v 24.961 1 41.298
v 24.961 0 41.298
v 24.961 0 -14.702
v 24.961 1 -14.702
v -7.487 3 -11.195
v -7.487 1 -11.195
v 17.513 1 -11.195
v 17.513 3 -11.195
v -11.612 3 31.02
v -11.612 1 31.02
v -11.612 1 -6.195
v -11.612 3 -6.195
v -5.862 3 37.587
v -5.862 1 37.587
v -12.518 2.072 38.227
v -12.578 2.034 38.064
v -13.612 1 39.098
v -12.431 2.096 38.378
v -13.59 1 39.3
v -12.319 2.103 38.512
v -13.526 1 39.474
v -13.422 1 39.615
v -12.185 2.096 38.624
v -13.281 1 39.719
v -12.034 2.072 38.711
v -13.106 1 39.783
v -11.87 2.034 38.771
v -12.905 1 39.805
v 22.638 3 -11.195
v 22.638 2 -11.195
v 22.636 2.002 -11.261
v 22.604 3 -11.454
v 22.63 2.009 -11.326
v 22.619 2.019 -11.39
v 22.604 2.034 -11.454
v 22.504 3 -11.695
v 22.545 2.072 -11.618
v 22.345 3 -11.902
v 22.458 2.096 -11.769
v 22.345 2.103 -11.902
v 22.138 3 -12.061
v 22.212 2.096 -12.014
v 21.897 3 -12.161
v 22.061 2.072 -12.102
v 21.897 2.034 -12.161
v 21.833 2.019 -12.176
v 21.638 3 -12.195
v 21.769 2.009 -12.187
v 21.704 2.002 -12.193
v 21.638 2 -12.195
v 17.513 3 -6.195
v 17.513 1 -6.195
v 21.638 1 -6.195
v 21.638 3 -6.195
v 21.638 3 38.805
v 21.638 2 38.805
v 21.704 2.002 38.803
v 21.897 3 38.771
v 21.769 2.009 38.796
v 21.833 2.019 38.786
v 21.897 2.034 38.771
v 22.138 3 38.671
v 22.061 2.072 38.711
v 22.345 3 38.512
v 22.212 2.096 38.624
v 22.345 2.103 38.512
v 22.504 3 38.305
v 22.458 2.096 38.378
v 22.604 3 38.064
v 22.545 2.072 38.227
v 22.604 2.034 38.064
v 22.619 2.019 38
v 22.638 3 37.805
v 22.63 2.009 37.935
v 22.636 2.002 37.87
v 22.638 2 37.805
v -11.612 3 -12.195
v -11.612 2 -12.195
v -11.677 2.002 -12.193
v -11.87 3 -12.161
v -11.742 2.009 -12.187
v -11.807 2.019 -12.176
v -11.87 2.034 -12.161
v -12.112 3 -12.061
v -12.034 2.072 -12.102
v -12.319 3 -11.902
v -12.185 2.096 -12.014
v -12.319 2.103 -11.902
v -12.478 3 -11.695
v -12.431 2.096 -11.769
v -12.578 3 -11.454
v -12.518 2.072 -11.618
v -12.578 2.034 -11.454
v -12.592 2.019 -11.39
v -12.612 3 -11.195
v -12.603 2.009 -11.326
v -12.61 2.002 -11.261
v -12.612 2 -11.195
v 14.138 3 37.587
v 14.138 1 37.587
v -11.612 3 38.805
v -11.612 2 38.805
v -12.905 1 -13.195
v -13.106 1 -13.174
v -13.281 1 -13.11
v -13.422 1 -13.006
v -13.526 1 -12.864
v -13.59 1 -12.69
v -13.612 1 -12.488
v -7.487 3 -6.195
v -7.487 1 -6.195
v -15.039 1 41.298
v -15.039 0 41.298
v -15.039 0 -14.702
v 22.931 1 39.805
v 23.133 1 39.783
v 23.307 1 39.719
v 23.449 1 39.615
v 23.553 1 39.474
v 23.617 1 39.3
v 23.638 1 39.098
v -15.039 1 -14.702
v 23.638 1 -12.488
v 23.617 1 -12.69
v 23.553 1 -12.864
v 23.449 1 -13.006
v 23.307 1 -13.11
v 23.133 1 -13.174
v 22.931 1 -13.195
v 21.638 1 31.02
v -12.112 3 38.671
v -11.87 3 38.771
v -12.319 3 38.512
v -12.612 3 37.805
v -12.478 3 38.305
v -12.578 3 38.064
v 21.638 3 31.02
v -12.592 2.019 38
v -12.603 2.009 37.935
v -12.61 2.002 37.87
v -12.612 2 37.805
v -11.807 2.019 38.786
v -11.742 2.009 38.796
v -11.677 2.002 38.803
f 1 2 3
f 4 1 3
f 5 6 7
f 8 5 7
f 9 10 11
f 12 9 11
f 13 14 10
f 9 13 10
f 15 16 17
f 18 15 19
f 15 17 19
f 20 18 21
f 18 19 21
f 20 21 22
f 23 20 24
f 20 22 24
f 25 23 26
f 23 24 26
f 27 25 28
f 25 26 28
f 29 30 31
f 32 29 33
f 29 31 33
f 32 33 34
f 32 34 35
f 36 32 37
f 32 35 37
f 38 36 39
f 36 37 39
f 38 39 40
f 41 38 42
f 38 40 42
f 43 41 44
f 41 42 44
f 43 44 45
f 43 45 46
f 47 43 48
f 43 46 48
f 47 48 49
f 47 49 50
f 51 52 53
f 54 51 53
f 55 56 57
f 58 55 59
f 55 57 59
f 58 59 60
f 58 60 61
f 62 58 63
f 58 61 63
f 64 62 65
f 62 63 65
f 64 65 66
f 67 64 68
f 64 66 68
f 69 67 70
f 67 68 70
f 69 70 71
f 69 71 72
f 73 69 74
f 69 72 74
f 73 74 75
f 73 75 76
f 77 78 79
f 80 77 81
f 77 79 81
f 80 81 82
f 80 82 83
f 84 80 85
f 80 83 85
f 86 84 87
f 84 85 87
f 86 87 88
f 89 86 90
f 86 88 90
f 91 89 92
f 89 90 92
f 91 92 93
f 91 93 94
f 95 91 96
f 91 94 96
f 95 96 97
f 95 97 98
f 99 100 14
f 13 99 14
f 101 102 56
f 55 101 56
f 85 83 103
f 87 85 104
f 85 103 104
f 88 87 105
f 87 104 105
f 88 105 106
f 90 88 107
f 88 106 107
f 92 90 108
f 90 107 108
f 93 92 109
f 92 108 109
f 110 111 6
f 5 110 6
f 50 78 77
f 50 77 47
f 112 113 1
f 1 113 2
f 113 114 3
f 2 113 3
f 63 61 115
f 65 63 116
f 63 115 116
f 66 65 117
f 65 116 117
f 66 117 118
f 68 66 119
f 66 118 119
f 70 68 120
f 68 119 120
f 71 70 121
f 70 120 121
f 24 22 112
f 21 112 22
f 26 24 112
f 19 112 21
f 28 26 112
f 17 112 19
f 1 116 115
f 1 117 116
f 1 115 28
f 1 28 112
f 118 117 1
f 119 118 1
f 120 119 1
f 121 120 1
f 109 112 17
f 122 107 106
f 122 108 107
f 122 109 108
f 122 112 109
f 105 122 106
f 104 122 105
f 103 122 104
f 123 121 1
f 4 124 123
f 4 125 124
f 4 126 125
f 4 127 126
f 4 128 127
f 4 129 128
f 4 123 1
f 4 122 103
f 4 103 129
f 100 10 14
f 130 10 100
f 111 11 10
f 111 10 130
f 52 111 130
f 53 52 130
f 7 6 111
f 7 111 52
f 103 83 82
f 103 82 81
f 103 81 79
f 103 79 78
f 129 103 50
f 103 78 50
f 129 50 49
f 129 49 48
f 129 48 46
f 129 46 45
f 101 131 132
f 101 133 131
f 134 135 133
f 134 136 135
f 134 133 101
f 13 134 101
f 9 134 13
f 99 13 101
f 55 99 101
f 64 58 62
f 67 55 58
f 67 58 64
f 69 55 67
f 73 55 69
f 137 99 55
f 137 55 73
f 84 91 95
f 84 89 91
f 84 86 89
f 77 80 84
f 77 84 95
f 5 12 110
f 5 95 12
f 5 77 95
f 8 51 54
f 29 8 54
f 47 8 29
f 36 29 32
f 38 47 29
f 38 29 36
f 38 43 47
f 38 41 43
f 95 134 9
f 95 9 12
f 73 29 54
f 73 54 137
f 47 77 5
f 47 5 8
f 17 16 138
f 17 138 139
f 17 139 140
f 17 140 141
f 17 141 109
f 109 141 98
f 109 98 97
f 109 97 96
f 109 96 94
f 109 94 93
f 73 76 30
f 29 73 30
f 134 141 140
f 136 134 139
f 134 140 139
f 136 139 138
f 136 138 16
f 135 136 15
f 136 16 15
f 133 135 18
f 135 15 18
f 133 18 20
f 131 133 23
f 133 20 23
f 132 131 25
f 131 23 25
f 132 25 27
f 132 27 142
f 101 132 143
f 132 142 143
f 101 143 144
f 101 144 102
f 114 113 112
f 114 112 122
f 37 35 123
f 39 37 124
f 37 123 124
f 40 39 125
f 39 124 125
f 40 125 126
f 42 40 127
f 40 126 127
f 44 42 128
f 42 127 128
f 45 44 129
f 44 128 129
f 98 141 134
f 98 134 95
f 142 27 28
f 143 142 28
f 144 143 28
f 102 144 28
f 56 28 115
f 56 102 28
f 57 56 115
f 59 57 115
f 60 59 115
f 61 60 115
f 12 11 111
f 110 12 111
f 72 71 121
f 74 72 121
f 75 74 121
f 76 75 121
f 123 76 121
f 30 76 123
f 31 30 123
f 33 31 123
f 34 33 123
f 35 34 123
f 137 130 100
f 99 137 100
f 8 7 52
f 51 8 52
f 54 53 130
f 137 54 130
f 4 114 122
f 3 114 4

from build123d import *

# Parameters (mm, degrees)
SKETCH_1_W      = 40
SKETCH_1_H      = 56
EXTRUDE_1_DEPTH = 1
SKETCH_2_W      = 35.25
SKETCH_2_H      = 51
EXTRUDE_2_DEPTH = 2
CHAMFER_1_SIZE  = 1
FILLET_1_R      = 1


with BuildPart() as part:
    # Эскиз1 → Бобышка-Вытянуть1 (new body)
    with BuildSketch(Plane(origin=(0, 0, 0), x_dir=(1, 0, 0), z_dir=(0, 1, 0))):
        with Locations((4.960996663, -13.297915159)):
            Rectangle(SKETCH_1_W, SKETCH_1_H)
    extrude(amount=EXTRUDE_1_DEPTH)

    # Эскиз2 → Бобышка-Вытянуть2 (add)
    with BuildSketch(Plane(origin=(0, 1, 0), x_dir=(1, 0, 0), z_dir=(0, 1, 0))):
        with Locations((5.013351172, -13.304787139)):
            Rectangle(SKETCH_2_W, SKETCH_2_H)
        Polygon((-7.486648828, 11.195212861), (17.513351172, 11.195212861), (17.513351172, 6.195212861), (21.638351172, 6.195212861), (21.638351172, -31.019787139), (14.138351172, -37.586749907), (-5.861648828, -37.586749907), (-11.611648828, -31.019787139), (-11.611648828, 6.195212861), (-7.486648828, 6.195212861), align=None, mode=Mode.SUBTRACT)
    extrude(amount=EXTRUDE_2_DEPTH)

    # Фаска1
    chamfer_1_edges = [part.edges().sort_by_distance(p)[0] for p in [
        (-12.611648828, 1, 13.304787139),
        (5.013351172, 1, 38.804787139),
        (22.638351172, 1, 13.304787139),
        (5.013351172, 1, -12.195212861),
    ]]
    chamfer(chamfer_1_edges, length=CHAMFER_1_SIZE)

    # Скругление1
    # the kernel refuses this fillet: 1 mm, written as the material it takes off along each edge
    with BuildSketch(Plane(origin=(-12.611648828, -0.5, -12.195212861), x_dir=(0, 0, 1), z_dir=(0, 1, 0))) as fillet_1_piece_1_section:
        with BuildLine():
            CenterArc((FILLET_1_R, FILLET_1_R), FILLET_1_R, 180, 90)
            Line((0, FILLET_1_R), (0, 0))
            Line((0, 0), (FILLET_1_R, 0))
        make_face()
    fillet_1_piece_1 = extrude(amount=6, mode=Mode.PRIVATE)
    fillet_1_piece_1 = split(fillet_1_piece_1, bisect_by=Plane(origin=(-12.204207693, 2.407441135, -12.152230903), z_dir=(0.7071067811865476, -0.7071067811865476, 0)), keep=Keep.TOP, mode=Mode.PRIVATE)
    fillet_1_piece_1 = split(fillet_1_piece_1, bisect_by=Plane(origin=(-12.0827213, 2.16446835, -12.030744511), z_dir=(0, 0.7071067811865476, -0.7071067811865476)), keep=Keep.TOP, mode=Mode.PRIVATE)
    add(fillet_1_piece_1, mode=Mode.SUBTRACT)
    with BuildSketch(Plane(origin=(-12.611648828, -0.5, -12.195212861), x_dir=(0, 0, 1), z_dir=(0, 1, 0))) as fillet_1_piece_2_section:
        with BuildLine():
            CenterArc((FILLET_1_R, FILLET_1_R), FILLET_1_R, 180, 90)
            Line((0, FILLET_1_R), (0, 0))
            Line((0, 0), (FILLET_1_R, 0))
        make_face()
    fillet_1_piece_2 = extrude(amount=6, mode=Mode.PRIVATE)
    fillet_1_piece_2 = split(fillet_1_piece_2, bisect_by=Plane(origin=(-12.447180477, 2.16446835, -11.666285334), z_dir=(-0.7071067811865476, 0.7071067811865476, 0)), keep=Keep.TOP, mode=Mode.PRIVATE)
    fillet_1_piece_2 = split(fillet_1_piece_2, bisect_by=Plane(origin=(-12.56866687, 2.407441135, -11.787771726), z_dir=(0, -0.7071067811865476, 0.7071067811865476)), keep=Keep.TOP, mode=Mode.PRIVATE)
    add(fillet_1_piece_2, mode=Mode.SUBTRACT)
    with BuildSketch(Plane(origin=(-12.611648828, -0.5, -12.195212861), x_dir=(0, 0, 1), z_dir=(0, 1, 0))) as fillet_1_piece_3_section:
        with BuildLine():
            CenterArc((FILLET_1_R, FILLET_1_R), FILLET_1_R, 180, 90)
            Line((0, FILLET_1_R), (0, 0))
            Line((0, 0), (FILLET_1_R, 0))
        make_face()
    fillet_1_piece_3 = extrude(amount=6, mode=Mode.PRIVATE)
    fillet_1_piece_3 = split(fillet_1_piece_3, bisect_by=Plane(origin=(-11.535111432, 3.076537395, -11.974767382), z_dir=(-0.7071067811865476, 0.7071067811865476, 0)), keep=Keep.TOP, mode=Mode.PRIVATE)
    fillet_1_piece_3 = split(fillet_1_piece_3, bisect_by=Plane(origin=(-12.391203349, 3.076537395, -11.118675466), z_dir=(0, 0.7071067811865476, -0.7071067811865476)), keep=Keep.TOP, mode=Mode.PRIVATE)
    add(fillet_1_piece_3, mode=Mode.SUBTRACT)
    with BuildSketch(Plane(origin=(-12.611648828, -0.5, 38.804787139), x_dir=(0, 0, -1), z_dir=(0, 1, 0))) as fillet_1_piece_4_section:
        with BuildLine():
            CenterArc((FILLET_1_R, -FILLET_1_R), FILLET_1_R, 90, 90)
            Line((0, -FILLET_1_R), (0, 0))
            Line((0, 0), (FILLET_1_R, 0))
        make_face()
    fillet_1_piece_4 = extrude(amount=6, mode=Mode.PRIVATE)
    fillet_1_piece_4 = split(fillet_1_piece_4, bisect_by=Plane(origin=(-12.204207693, 2.407441135, 38.761805181), z_dir=(0.7071067811865476, -0.7071067811865476, 0)), keep=Keep.TOP, mode=Mode.PRIVATE)
    fillet_1_piece_4 = split(fillet_1_piece_4, bisect_by=Plane(origin=(-12.0827213, 2.16446835, 38.640318789), z_dir=(0, 0.7071067811865476, 0.7071067811865476)), keep=Keep.TOP, mode=Mode.PRIVATE)
    add(fillet_1_piece_4, mode=Mode.SUBTRACT)
    with BuildSketch(Plane(origin=(-12.611648828, -0.5, 38.804787139), x_dir=(0, 0, -1), z_dir=(0, 1, 0))) as fillet_1_piece_5_section:
        with BuildLine():
            CenterArc((FILLET_1_R, -FILLET_1_R), FILLET_1_R, 90, 90)
            Line((0, -FILLET_1_R), (0, 0))
            Line((0, 0), (FILLET_1_R, 0))
        make_face()
    fillet_1_piece_5 = extrude(amount=6, mode=Mode.PRIVATE)
    fillet_1_piece_5 = split(fillet_1_piece_5, bisect_by=Plane(origin=(-12.447180477, 2.16446835, 38.275859612), z_dir=(-0.7071067811865476, 0.7071067811865476, 0)), keep=Keep.TOP, mode=Mode.PRIVATE)
    fillet_1_piece_5 = split(fillet_1_piece_5, bisect_by=Plane(origin=(-12.56866687, 2.407441135, 38.397346004), z_dir=(0, -0.7071067811865476, -0.7071067811865476)), keep=Keep.TOP, mode=Mode.PRIVATE)
    add(fillet_1_piece_5, mode=Mode.SUBTRACT)
    with BuildSketch(Plane(origin=(-12.611648828, -0.5, 38.804787139), x_dir=(0, 0, -1), z_dir=(0, 1, 0))) as fillet_1_piece_6_section:
        with BuildLine():
            CenterArc((FILLET_1_R, -FILLET_1_R), FILLET_1_R, 90, 90)
            Line((0, -FILLET_1_R), (0, 0))
            Line((0, 0), (FILLET_1_R, 0))
        make_face()
    fillet_1_piece_6 = extrude(amount=6, mode=Mode.PRIVATE)
    fillet_1_piece_6 = split(fillet_1_piece_6, bisect_by=Plane(origin=(-11.535111432, 3.076537395, 38.58434166), z_dir=(-0.7071067811865476, 0.7071067811865476, 0)), keep=Keep.TOP, mode=Mode.PRIVATE)
    fillet_1_piece_6 = split(fillet_1_piece_6, bisect_by=Plane(origin=(-12.391203349, 3.076537395, 37.728249744), z_dir=(0, 0.7071067811865476, 0.7071067811865476)), keep=Keep.TOP, mode=Mode.PRIVATE)
    add(fillet_1_piece_6, mode=Mode.SUBTRACT)
    with BuildSketch(Plane(origin=(22.638351172, -0.5, 38.804787139), x_dir=(-1, 0, 0), z_dir=(0, 1, 0))) as fillet_1_piece_7_section:
        with BuildLine():
            CenterArc((FILLET_1_R, -FILLET_1_R), FILLET_1_R, 90, 90)
            Line((0, -FILLET_1_R), (0, 0))
            Line((0, 0), (FILLET_1_R, 0))
        make_face()
    fillet_1_piece_7 = extrude(amount=6, mode=Mode.PRIVATE)
    fillet_1_piece_7 = split(fillet_1_piece_7, bisect_by=Plane(origin=(22.595369214, 2.407441135, 38.397346004), z_dir=(0, -0.7071067811865476, -0.7071067811865476)), keep=Keep.TOP, mode=Mode.PRIVATE)
    fillet_1_piece_7 = split(fillet_1_piece_7, bisect_by=Plane(origin=(22.473882822, 2.16446835, 38.275859612), z_dir=(0.7071067811865476, 0.7071067811865476, 0)), keep=Keep.TOP, mode=Mode.PRIVATE)
    add(fillet_1_piece_7, mode=Mode.SUBTRACT)
    with BuildSketch(Plane(origin=(22.638351172, -0.5, 38.804787139), x_dir=(-1, 0, 0), z_dir=(0, 1, 0))) as fillet_1_piece_8_section:
        with BuildLine():
            CenterArc((FILLET_1_R, -FILLET_1_R), FILLET_1_R, 90, 90)
            Line((0, -FILLET_1_R), (0, 0))
            Line((0, 0), (FILLET_1_R, 0))
        make_face()
    fillet_1_piece_8 = extrude(amount=6, mode=Mode.PRIVATE)
    fillet_1_piece_8 = split(fillet_1_piece_8, bisect_by=Plane(origin=(22.109423645, 2.16446835, 38.640318789), z_dir=(0, 0.7071067811865476, 0.7071067811865476)), keep=Keep.TOP, mode=Mode.PRIVATE)
    fillet_1_piece_8 = split(fillet_1_piece_8, bisect_by=Plane(origin=(22.230910038, 2.407441135, 38.761805181), z_dir=(-0.7071067811865476, -0.7071067811865476, 0)), keep=Keep.TOP, mode=Mode.PRIVATE)
    add(fillet_1_piece_8, mode=Mode.SUBTRACT)
    with BuildSketch(Plane(origin=(22.638351172, -0.5, 38.804787139), x_dir=(-1, 0, 0), z_dir=(0, 1, 0))) as fillet_1_piece_9_section:
        with BuildLine():
            CenterArc((FILLET_1_R, -FILLET_1_R), FILLET_1_R, 90, 90)
            Line((0, -FILLET_1_R), (0, 0))
            Line((0, 0), (FILLET_1_R, 0))
        make_face()
    fillet_1_piece_9 = extrude(amount=6, mode=Mode.PRIVATE)
    fillet_1_piece_9 = split(fillet_1_piece_9, bisect_by=Plane(origin=(22.417905694, 3.076537395, 37.728249744), z_dir=(0, 0.7071067811865476, 0.7071067811865476)), keep=Keep.TOP, mode=Mode.PRIVATE)
    fillet_1_piece_9 = split(fillet_1_piece_9, bisect_by=Plane(origin=(21.561813777, 3.076537395, 38.58434166), z_dir=(0.7071067811865476, 0.7071067811865476, 0)), keep=Keep.TOP, mode=Mode.PRIVATE)
    add(fillet_1_piece_9, mode=Mode.SUBTRACT)
    with BuildSketch(Plane(origin=(22.638351172, -0.5, -12.195212861), x_dir=(-1, 0, 0), z_dir=(0, 1, 0))) as fillet_1_piece_10_section:
        with BuildLine():
            CenterArc((FILLET_1_R, FILLET_1_R), FILLET_1_R, 180, 90)
            Line((0, FILLET_1_R), (0, 0))
            Line((0, 0), (FILLET_1_R, 0))
        make_face()
    fillet_1_piece_10 = extrude(amount=6, mode=Mode.PRIVATE)
    fillet_1_piece_10 = split(fillet_1_piece_10, bisect_by=Plane(origin=(22.595369214, 2.407441135, -11.787771726), z_dir=(0, -0.7071067811865476, 0.7071067811865476)), keep=Keep.TOP, mode=Mode.PRIVATE)
    fillet_1_piece_10 = split(fillet_1_piece_10, bisect_by=Plane(origin=(22.473882822, 2.16446835, -11.666285334), z_dir=(0.7071067811865476, 0.7071067811865476, 0)), keep=Keep.TOP, mode=Mode.PRIVATE)
    add(fillet_1_piece_10, mode=Mode.SUBTRACT)
    with BuildSketch(Plane(origin=(22.638351172, -0.5, -12.195212861), x_dir=(-1, 0, 0), z_dir=(0, 1, 0))) as fillet_1_piece_11_section:
        with BuildLine():
            CenterArc((FILLET_1_R, FILLET_1_R), FILLET_1_R, 180, 90)
            Line((0, FILLET_1_R), (0, 0))
            Line((0, 0), (FILLET_1_R, 0))
        make_face()
    fillet_1_piece_11 = extrude(amount=6, mode=Mode.PRIVATE)
    fillet_1_piece_11 = split(fillet_1_piece_11, bisect_by=Plane(origin=(22.109423645, 2.16446835, -12.030744511), z_dir=(0, 0.7071067811865476, -0.7071067811865476)), keep=Keep.TOP, mode=Mode.PRIVATE)
    fillet_1_piece_11 = split(fillet_1_piece_11, bisect_by=Plane(origin=(22.230910038, 2.407441135, -12.152230903), z_dir=(-0.7071067811865476, -0.7071067811865476, 0)), keep=Keep.TOP, mode=Mode.PRIVATE)
    add(fillet_1_piece_11, mode=Mode.SUBTRACT)
    with BuildSketch(Plane(origin=(22.638351172, -0.5, -12.195212861), x_dir=(-1, 0, 0), z_dir=(0, 1, 0))) as fillet_1_piece_12_section:
        with BuildLine():
            CenterArc((FILLET_1_R, FILLET_1_R), FILLET_1_R, 180, 90)
            Line((0, FILLET_1_R), (0, 0))
            Line((0, 0), (FILLET_1_R, 0))
        make_face()
    fillet_1_piece_12 = extrude(amount=6, mode=Mode.PRIVATE)
    fillet_1_piece_12 = split(fillet_1_piece_12, bisect_by=Plane(origin=(22.417905694, 3.076537395, -11.118675466), z_dir=(0, 0.7071067811865476, -0.7071067811865476)), keep=Keep.TOP, mode=Mode.PRIVATE)
    fillet_1_piece_12 = split(fillet_1_piece_12, bisect_by=Plane(origin=(21.561813777, 3.076537395, -11.974767382), z_dir=(0.7071067811865476, 0.7071067811865476, 0)), keep=Keep.TOP, mode=Mode.PRIVATE)
    add(fillet_1_piece_12, mode=Mode.SUBTRACT)
    with BuildSketch(Plane(origin=(24.471684506, 0.166666667, -14.028546194), x_dir=(-0.816496580927726, -0.4082482904638632, -0.40824829046386296), z_dir=(-0.5773502691896258, 0.5773502691896258, 0.5773502691896258))) as fillet_1_piece_13_section:
        with BuildLine():
            CenterArc((FILLET_1_R * 0.57735026919, FILLET_1_R), FILLET_1_R, 210, 60)
            Line((-FILLET_1_R * 0.288675134595, FILLET_1_R * 0.5), (0, 0))
            Line((0, 0), (FILLET_1_R * 0.57735026919, 0))
        make_face()
    fillet_1_piece_13 = extrude(amount=4.618802154, mode=Mode.PRIVATE)
    fillet_1_piece_13 = split(fillet_1_piece_13, bisect_by=Plane(origin=(23.11868341, 1, -12.675545099), z_dir=(0, 1, 0)), keep=Keep.TOP, mode=Mode.PRIVATE)
    fillet_1_piece_13 = split(fillet_1_piece_13, bisect_by=Plane(origin=(23.11868341, 1.382025047, -12.195212861), z_dir=(0, 0, -1)), keep=Keep.TOP, mode=Mode.PRIVATE)
    fillet_1_piece_13 = split(fillet_1_piece_13, bisect_by=Plane(origin=(22.638351172, 1.382025047, -12.675545099), z_dir=(1, 0, 0)), keep=Keep.TOP, mode=Mode.PRIVATE)
    add(fillet_1_piece_13, mode=Mode.SUBTRACT)
    with BuildSketch(Plane(origin=(24.471684506, 0.166666667, -14.028546194), x_dir=(-0.816496580927726, -0.4082482904638632, -0.40824829046386296), z_dir=(-0.5773502691896258, 0.5773502691896258, 0.5773502691896258))) as fillet_1_piece_14_section:
        with BuildLine():
            CenterArc((FILLET_1_R * 0.57735026919, FILLET_1_R), FILLET_1_R, 210, 60)
            Line((-FILLET_1_R * 0.288675134595, FILLET_1_R * 0.5), (0, 0))
            Line((0, 0), (FILLET_1_R * 0.57735026919, 0))
        make_face()
    fillet_1_piece_14 = extrude(amount=4.618802154, mode=Mode.PRIVATE)
    fillet_1_piece_14 = split(fillet_1_piece_14, bisect_by=Plane(origin=(22.825799609, 1.79813974, -12.195212861), z_dir=(0, 0, 1)), keep=Keep.TOP, mode=Mode.PRIVATE)
    fillet_1_piece_14 = split(fillet_1_piece_14, bisect_by=Plane(origin=(22.638351172, 1.79813974, -12.007764424), z_dir=(1, 0, 0)), keep=Keep.TOP, mode=Mode.PRIVATE)
    add(fillet_1_piece_14, mode=Mode.SUBTRACT)
    with BuildSketch(Plane(origin=(24.471684506, 0.166666667, -14.028546194), x_dir=(-0.816496580927726, -0.4082482904638632, -0.40824829046386296), z_dir=(-0.5773502691896258, 0.5773502691896258, 0.5773502691896258))) as fillet_1_piece_15_section:
        with BuildLine():
            CenterArc((FILLET_1_R * 0.57735026919, FILLET_1_R), FILLET_1_R, 210, 60)
            Line((-FILLET_1_R * 0.288675134595, FILLET_1_R * 0.5), (0, 0))
            Line((0, 0), (FILLET_1_R * 0.57735026919, 0))
        make_face()
    fillet_1_piece_15 = extrude(amount=4.618802154, mode=Mode.PRIVATE)
    fillet_1_piece_15 = split(fillet_1_piece_15, bisect_by=Plane(origin=(22.450902736, 1.79813974, -12.195212861), z_dir=(0, 0, -1)), keep=Keep.TOP, mode=Mode.PRIVATE)
    fillet_1_piece_15 = split(fillet_1_piece_15, bisect_by=Plane(origin=(22.638351172, 1.79813974, -12.382661298), z_dir=(-1, 0, 0)), keep=Keep.TOP, mode=Mode.PRIVATE)
    add(fillet_1_piece_15, mode=Mode.SUBTRACT)
    with BuildSketch(Plane(origin=(24.471684506, 0.166666667, 40.638120472), x_dir=(-0.816496580927726, -0.40824829046385686, 0.4082482904638692), z_dir=(-0.5773502691896258, 0.5773502691896258, -0.5773502691896258))) as fillet_1_piece_16_section:
        with BuildLine():
            CenterArc((FILLET_1_R * 0.57735026919, -FILLET_1_R), FILLET_1_R, 90, 60)
            Line((-FILLET_1_R * 0.288675134595, -FILLET_1_R * 0.5), (0, 0))
            Line((0, 0), (FILLET_1_R * 0.57735026919, 0))
        make_face()
    fillet_1_piece_16 = extrude(amount=4.618802154, mode=Mode.PRIVATE)
    fillet_1_piece_16 = split(fillet_1_piece_16, bisect_by=Plane(origin=(23.11868341, 1, 39.285119377), z_dir=(0, 1, 0)), keep=Keep.TOP, mode=Mode.PRIVATE)
    fillet_1_piece_16 = split(fillet_1_piece_16, bisect_by=Plane(origin=(23.11868341, 1.382025047, 38.804787139), z_dir=(0, 0, 1)), keep=Keep.TOP, mode=Mode.PRIVATE)
    fillet_1_piece_16 = split(fillet_1_piece_16, bisect_by=Plane(origin=(22.638351172, 1.382025047, 39.285119377), z_dir=(1, 0, 0)), keep=Keep.TOP, mode=Mode.PRIVATE)
    add(fillet_1_piece_16, mode=Mode.SUBTRACT)
    with BuildSketch(Plane(origin=(24.471684506, 0.166666667, 40.638120472), x_dir=(-0.816496580927726, -0.40824829046385686, 0.4082482904638692), z_dir=(-0.5773502691896258, 0.5773502691896258, -0.5773502691896258))) as fillet_1_piece_17_section:
        with BuildLine():
            CenterArc((FILLET_1_R * 0.57735026919, -FILLET_1_R), FILLET_1_R, 90, 60)
            Line((-FILLET_1_R * 0.288675134595, -FILLET_1_R * 0.5), (0, 0))
            Line((0, 0), (FILLET_1_R * 0.57735026919, 0))
        make_face()
    fillet_1_piece_17 = extrude(amount=4.618802154, mode=Mode.PRIVATE)
    fillet_1_piece_17 = split(fillet_1_piece_17, bisect_by=Plane(origin=(22.825799609, 1.79813974, 38.804787139), z_dir=(0, 0, -1)), keep=Keep.TOP, mode=Mode.PRIVATE)
    fillet_1_piece_17 = split(fillet_1_piece_17, bisect_by=Plane(origin=(22.638351172, 1.79813974, 38.617338702), z_dir=(1, 0, 0)), keep=Keep.TOP, mode=Mode.PRIVATE)
    add(fillet_1_piece_17, mode=Mode.SUBTRACT)
    with BuildSketch(Plane(origin=(24.471684506, 0.166666667, 40.638120472), x_dir=(-0.816496580927726, -0.40824829046385686, 0.4082482904638692), z_dir=(-0.5773502691896258, 0.5773502691896258, -0.5773502691896258))) as fillet_1_piece_18_section:
        with BuildLine():
            CenterArc((FILLET_1_R * 0.57735026919, -FILLET_1_R), FILLET_1_R, 90, 60)
            Line((-FILLET_1_R * 0.288675134595, -FILLET_1_R * 0.5), (0, 0))
            Line((0, 0), (FILLET_1_R * 0.57735026919, 0))
        make_face()
    fillet_1_piece_18 = extrude(amount=4.618802154, mode=Mode.PRIVATE)
    fillet_1_piece_18 = split(fillet_1_piece_18, bisect_by=Plane(origin=(22.450902736, 1.79813974, 38.804787139), z_dir=(0, 0, 1)), keep=Keep.TOP, mode=Mode.PRIVATE)
    fillet_1_piece_18 = split(fillet_1_piece_18, bisect_by=Plane(origin=(22.638351172, 1.79813974, 38.992235576), z_dir=(-1, 0, 0)), keep=Keep.TOP, mode=Mode.PRIVATE)
    add(fillet_1_piece_18, mode=Mode.SUBTRACT)
    with BuildSketch(Plane(origin=(-14.444982161, 0.166666667, -14.028546194), x_dir=(-0.40824829046386274, -0.40824829046386335, 0.8164965809277261), z_dir=(0.5773502691896258, 0.5773502691896258, 0.5773502691896258))) as fillet_1_piece_19_section:
        with BuildLine():
            CenterArc((FILLET_1_R * 0.57735026919, FILLET_1_R), FILLET_1_R, 210, 60)
            Line((-FILLET_1_R * 0.288675134595, FILLET_1_R * 0.5), (0, 0))
            Line((0, 0), (FILLET_1_R * 0.57735026919, 0))
        make_face()
    fillet_1_piece_19 = extrude(amount=4.618802154, mode=Mode.PRIVATE)
    fillet_1_piece_19 = split(fillet_1_piece_19, bisect_by=Plane(origin=(-13.091981065, 1, -12.675545099), z_dir=(0, 1, 0)), keep=Keep.TOP, mode=Mode.PRIVATE)
    fillet_1_piece_19 = split(fillet_1_piece_19, bisect_by=Plane(origin=(-12.611648828, 1.382025047, -12.675545099), z_dir=(-1, 0, 0)), keep=Keep.TOP, mode=Mode.PRIVATE)
    fillet_1_piece_19 = split(fillet_1_piece_19, bisect_by=Plane(origin=(-13.091981065, 1.382025047, -12.195212861), z_dir=(0, 0, -1)), keep=Keep.TOP, mode=Mode.PRIVATE)
    add(fillet_1_piece_19, mode=Mode.SUBTRACT)
    with BuildSketch(Plane(origin=(-14.444982161, 0.166666667, -14.028546194), x_dir=(-0.40824829046386274, -0.40824829046386335, 0.8164965809277261), z_dir=(0.5773502691896258, 0.5773502691896258, 0.5773502691896258))) as fillet_1_piece_20_section:
        with BuildLine():
            CenterArc((FILLET_1_R * 0.57735026919, FILLET_1_R), FILLET_1_R, 210, 60)
            Line((-FILLET_1_R * 0.288675134595, FILLET_1_R * 0.5), (0, 0))
            Line((0, 0), (FILLET_1_R * 0.57735026919, 0))
        make_face()
    fillet_1_piece_20 = extrude(amount=4.618802154, mode=Mode.PRIVATE)
    fillet_1_piece_20 = split(fillet_1_piece_20, bisect_by=Plane(origin=(-12.611648828, 1.79813974, -12.382661298), z_dir=(1, 0, 0)), keep=Keep.TOP, mode=Mode.PRIVATE)
    fillet_1_piece_20 = split(fillet_1_piece_20, bisect_by=Plane(origin=(-12.424200391, 1.79813974, -12.195212861), z_dir=(0, 0, -1)), keep=Keep.TOP, mode=Mode.PRIVATE)
    add(fillet_1_piece_20, mode=Mode.SUBTRACT)
    with BuildSketch(Plane(origin=(-14.444982161, 0.166666667, -14.028546194), x_dir=(-0.40824829046386274, -0.40824829046386335, 0.8164965809277261), z_dir=(0.5773502691896258, 0.5773502691896258, 0.5773502691896258))) as fillet_1_piece_21_section:
        with BuildLine():
            CenterArc((FILLET_1_R * 0.57735026919, FILLET_1_R), FILLET_1_R, 210, 60)
            Line((-FILLET_1_R * 0.288675134595, FILLET_1_R * 0.5), (0, 0))
            Line((0, 0), (FILLET_1_R * 0.57735026919, 0))
        make_face()
    fillet_1_piece_21 = extrude(amount=4.618802154, mode=Mode.PRIVATE)
    fillet_1_piece_21 = split(fillet_1_piece_21, bisect_by=Plane(origin=(-12.611648828, 1.79813974, -12.007764424), z_dir=(-1, 0, 0)), keep=Keep.TOP, mode=Mode.PRIVATE)
    fillet_1_piece_21 = split(fillet_1_piece_21, bisect_by=Plane(origin=(-12.799097264, 1.79813974, -12.195212861), z_dir=(0, 0, 1)), keep=Keep.TOP, mode=Mode.PRIVATE)
    add(fillet_1_piece_21, mode=Mode.SUBTRACT)
    with BuildSketch(Plane(origin=(-14.444982161, 0.166666667, 40.638120472), x_dir=(-0.4082482904638619, -0.408248290463864, -0.816496580927726), z_dir=(0.5773502691896258, 0.5773502691896258, -0.5773502691896258))) as fillet_1_piece_22_section:
        with BuildLine():
            CenterArc((FILLET_1_R * 0.57735026919, -FILLET_1_R), FILLET_1_R, 90, 60)
            Line((-FILLET_1_R * 0.288675134595, -FILLET_1_R * 0.5), (0, 0))
            Line((0, 0), (FILLET_1_R * 0.57735026919, 0))
        make_face()
    fillet_1_piece_22 = extrude(amount=4.618802154, mode=Mode.PRIVATE)
    fillet_1_piece_22 = split(fillet_1_piece_22, bisect_by=Plane(origin=(-13.091981065, 1, 39.285119377), z_dir=(0, 1, 0)), keep=Keep.TOP, mode=Mode.PRIVATE)
    fillet_1_piece_22 = split(fillet_1_piece_22, bisect_by=Plane(origin=(-12.611648828, 1.382025047, 39.285119377), z_dir=(-1, 0, 0)), keep=Keep.TOP, mode=Mode.PRIVATE)
    fillet_1_piece_22 = split(fillet_1_piece_22, bisect_by=Plane(origin=(-13.091981065, 1.382025047, 38.804787139), z_dir=(0, 0, 1)), keep=Keep.TOP, mode=Mode.PRIVATE)
    add(fillet_1_piece_22, mode=Mode.SUBTRACT)
    with BuildSketch(Plane(origin=(-14.444982161, 0.166666667, 40.638120472), x_dir=(-0.4082482904638619, -0.408248290463864, -0.816496580927726), z_dir=(0.5773502691896258, 0.5773502691896258, -0.5773502691896258))) as fillet_1_piece_23_section:
        with BuildLine():
            CenterArc((FILLET_1_R * 0.57735026919, -FILLET_1_R), FILLET_1_R, 90, 60)
            Line((-FILLET_1_R * 0.288675134595, -FILLET_1_R * 0.5), (0, 0))
            Line((0, 0), (FILLET_1_R * 0.57735026919, 0))
        make_face()
    fillet_1_piece_23 = extrude(amount=4.618802154, mode=Mode.PRIVATE)
    fillet_1_piece_23 = split(fillet_1_piece_23, bisect_by=Plane(origin=(-12.611648828, 1.79813974, 38.992235576), z_dir=(1, 0, 0)), keep=Keep.TOP, mode=Mode.PRIVATE)
    fillet_1_piece_23 = split(fillet_1_piece_23, bisect_by=Plane(origin=(-12.424200391, 1.79813974, 38.804787139), z_dir=(0, 0, 1)), keep=Keep.TOP, mode=Mode.PRIVATE)
    add(fillet_1_piece_23, mode=Mode.SUBTRACT)
    with BuildSketch(Plane(origin=(-14.444982161, 0.166666667, 40.638120472), x_dir=(-0.4082482904638619, -0.408248290463864, -0.816496580927726), z_dir=(0.5773502691896258, 0.5773502691896258, -0.5773502691896258))) as fillet_1_piece_24_section:
        with BuildLine():
            CenterArc((FILLET_1_R * 0.57735026919, -FILLET_1_R), FILLET_1_R, 90, 60)
            Line((-FILLET_1_R * 0.288675134595, -FILLET_1_R * 0.5), (0, 0))
            Line((0, 0), (FILLET_1_R * 0.57735026919, 0))
        make_face()
    fillet_1_piece_24 = extrude(amount=4.618802154, mode=Mode.PRIVATE)
    fillet_1_piece_24 = split(fillet_1_piece_24, bisect_by=Plane(origin=(-12.611648828, 1.79813974, 38.617338702), z_dir=(-1, 0, 0)), keep=Keep.TOP, mode=Mode.PRIVATE)
    fillet_1_piece_24 = split(fillet_1_piece_24, bisect_by=Plane(origin=(-12.799097264, 1.79813974, 38.804787139), z_dir=(0, 0, -1)), keep=Keep.TOP, mode=Mode.PRIVATE)
    add(fillet_1_piece_24, mode=Mode.SUBTRACT)
    with BuildSketch(Plane(origin=(-14.444982161, 0.166666667, -14.028546194), x_dir=(-0.40824829046386274, -0.40824829046386335, 0.8164965809277261), z_dir=(0.5773502691896258, 0.5773502691896258, 0.5773502691896258))) as fillet_1_piece_25a_section:
        with BuildLine():
            CenterArc((FILLET_1_R * 0.57735026919, FILLET_1_R), FILLET_1_R, 210, 60)
            Line((-FILLET_1_R * 0.288675134595, FILLET_1_R * 0.5), (0, 0))
            Line((0, 0), (FILLET_1_R * 0.57735026919, 0))
        make_face()
    fillet_1_piece_25a = extrude(amount=4.618802154, mode=Mode.PRIVATE)
    fillet_1_piece_25a = split(fillet_1_piece_25a, bisect_by=Plane(origin=(-12.611648828, 2.347749558, -11.699257601), z_dir=(1, 0, 0)), keep=Keep.TOP, mode=Mode.PRIVATE)
    fillet_1_piece_25a = split(fillet_1_piece_25a, bisect_by=Plane(origin=(-12.115693568, 2.347749558, -12.195212861), z_dir=(0, 0, 1)), keep=Keep.TOP, mode=Mode.PRIVATE)
    with BuildSketch(Plane(origin=(-12.611648828, -0.5, -12.195212861), x_dir=(0, 0, 1), z_dir=(0, 1, 0))) as fillet_1_piece_25b_section:
        with BuildLine():
            CenterArc((FILLET_1_R, FILLET_1_R), FILLET_1_R, 180, 90)
            Line((0, FILLET_1_R), (0, 0))
            Line((0, 0), (FILLET_1_R, 0))
        make_face()
    fillet_1_piece_25b = extrude(amount=6, mode=Mode.PRIVATE)
    fillet_1_piece_25b = split(fillet_1_piece_25b, bisect_by=Plane(origin=(-13.104295651, 1.507353177, -11.968643573), z_dir=(0.7071067811865476, -0.7071067811865476, 0)), keep=Keep.TOP, mode=Mode.PRIVATE)
    fillet_1_piece_25b = split(fillet_1_piece_25b, bisect_by=Plane(origin=(-12.38507954, 1.507353177, -12.687859684), z_dir=(0, -0.7071067811865476, 0.7071067811865476)), keep=Keep.TOP, mode=Mode.PRIVATE)
    fillet_1_piece_25 = fillet_1_piece_25a & fillet_1_piece_25b
    add(fillet_1_piece_25, mode=Mode.SUBTRACT)
    with BuildSketch(Plane(origin=(-14.444982161, 0.166666667, 40.638120472), x_dir=(-0.4082482904638619, -0.408248290463864, -0.816496580927726), z_dir=(0.5773502691896258, 0.5773502691896258, -0.5773502691896258))) as fillet_1_piece_26a_section:
        with BuildLine():
            CenterArc((FILLET_1_R * 0.57735026919, -FILLET_1_R), FILLET_1_R, 90, 60)
            Line((-FILLET_1_R * 0.288675134595, -FILLET_1_R * 0.5), (0, 0))
            Line((0, 0), (FILLET_1_R * 0.57735026919, 0))
        make_face()
    fillet_1_piece_26a = extrude(amount=4.618802154, mode=Mode.PRIVATE)
    fillet_1_piece_26a = split(fillet_1_piece_26a, bisect_by=Plane(origin=(-12.611648828, 2.347749558, 38.308831879), z_dir=(1, 0, 0)), keep=Keep.TOP, mode=Mode.PRIVATE)
    fillet_1_piece_26a = split(fillet_1_piece_26a, bisect_by=Plane(origin=(-12.115693568, 2.347749558, 38.804787139), z_dir=(0, 0, -1)), keep=Keep.TOP, mode=Mode.PRIVATE)
    with BuildSketch(Plane(origin=(-12.611648828, -0.5, 38.804787139), x_dir=(0, 0, -1), z_dir=(0, 1, 0))) as fillet_1_piece_26b_section:
        with BuildLine():
            CenterArc((FILLET_1_R, -FILLET_1_R), FILLET_1_R, 90, 90)
            Line((0, -FILLET_1_R), (0, 0))
            Line((0, 0), (FILLET_1_R, 0))
        make_face()
    fillet_1_piece_26b = extrude(amount=6, mode=Mode.PRIVATE)
    fillet_1_piece_26b = split(fillet_1_piece_26b, bisect_by=Plane(origin=(-13.104295651, 1.507353177, 38.578217851), z_dir=(0.7071067811865476, -0.7071067811865476, 0)), keep=Keep.TOP, mode=Mode.PRIVATE)
    fillet_1_piece_26b = split(fillet_1_piece_26b, bisect_by=Plane(origin=(-12.38507954, 1.507353177, 39.297433962), z_dir=(0, -0.7071067811865476, -0.7071067811865476)), keep=Keep.TOP, mode=Mode.PRIVATE)
    fillet_1_piece_26 = fillet_1_piece_26a & fillet_1_piece_26b
    add(fillet_1_piece_26, mode=Mode.SUBTRACT)
    with BuildSketch(Plane(origin=(24.471684506, 0.166666667, 40.638120472), x_dir=(-0.816496580927726, -0.40824829046385686, 0.4082482904638692), z_dir=(-0.5773502691896258, 0.5773502691896258, -0.5773502691896258))) as fillet_1_piece_27a_section:
        with BuildLine():
            CenterArc((FILLET_1_R * 0.57735026919, -FILLET_1_R), FILLET_1_R, 90, 60)
            Line((-FILLET_1_R * 0.288675134595, -FILLET_1_R * 0.5), (0, 0))
            Line((0, 0), (FILLET_1_R * 0.57735026919, 0))
        make_face()
    fillet_1_piece_27a = extrude(amount=4.618802154, mode=Mode.PRIVATE)
    fillet_1_piece_27a = split(fillet_1_piece_27a, bisect_by=Plane(origin=(22.142395913, 2.347749558, 38.804787139), z_dir=(0, 0, -1)), keep=Keep.TOP, mode=Mode.PRIVATE)
    fillet_1_piece_27a = split(fillet_1_piece_27a, bisect_by=Plane(origin=(22.638351172, 2.347749558, 38.308831879), z_dir=(-1, 0, 0)), keep=Keep.TOP, mode=Mode.PRIVATE)
    with BuildSketch(Plane(origin=(22.638351172, -0.5, 38.804787139), x_dir=(-1, 0, 0), z_dir=(0, 1, 0))) as fillet_1_piece_27b_section:
        with BuildLine():
            CenterArc((FILLET_1_R, -FILLET_1_R), FILLET_1_R, 90, 90)
            Line((0, -FILLET_1_R), (0, 0))
            Line((0, 0), (FILLET_1_R, 0))
        make_face()
    fillet_1_piece_27b = extrude(amount=6, mode=Mode.PRIVATE)
    fillet_1_piece_27b = split(fillet_1_piece_27b, bisect_by=Plane(origin=(22.411781885, 1.507353177, 39.297433962), z_dir=(0, -0.7071067811865476, -0.7071067811865476)), keep=Keep.TOP, mode=Mode.PRIVATE)
    fillet_1_piece_27b = split(fillet_1_piece_27b, bisect_by=Plane(origin=(23.130997996, 1.507353177, 38.578217851), z_dir=(-0.7071067811865476, -0.7071067811865476, 0)), keep=Keep.TOP, mode=Mode.PRIVATE)
    fillet_1_piece_27 = fillet_1_piece_27a & fillet_1_piece_27b
    add(fillet_1_piece_27, mode=Mode.SUBTRACT)
    with BuildSketch(Plane(origin=(24.471684506, 0.166666667, -14.028546194), x_dir=(-0.816496580927726, -0.4082482904638632, -0.40824829046386296), z_dir=(-0.5773502691896258, 0.5773502691896258, 0.5773502691896258))) as fillet_1_piece_28a_section:
        with BuildLine():
            CenterArc((FILLET_1_R * 0.57735026919, FILLET_1_R), FILLET_1_R, 210, 60)
            Line((-FILLET_1_R * 0.288675134595, FILLET_1_R * 0.5), (0, 0))
            Line((0, 0), (FILLET_1_R * 0.57735026919, 0))
        make_face()
    fillet_1_piece_28a = extrude(amount=4.618802154, mode=Mode.PRIVATE)
    fillet_1_piece_28a = split(fillet_1_piece_28a, bisect_by=Plane(origin=(22.142395913, 2.347749558, -12.195212861), z_dir=(0, 0, 1)), keep=Keep.TOP, mode=Mode.PRIVATE)
    fillet_1_piece_28a = split(fillet_1_piece_28a, bisect_by=Plane(origin=(22.638351172, 2.347749558, -11.699257601), z_dir=(-1, 0, 0)), keep=Keep.TOP, mode=Mode.PRIVATE)
    with BuildSketch(Plane(origin=(22.638351172, -0.5, -12.195212861), x_dir=(-1, 0, 0), z_dir=(0, 1, 0))) as fillet_1_piece_28b_section:
        with BuildLine():
            CenterArc((FILLET_1_R, FILLET_1_R), FILLET_1_R, 180, 90)
            Line((0, FILLET_1_R), (0, 0))
            Line((0, 0), (FILLET_1_R, 0))
        make_face()
    fillet_1_piece_28b = extrude(amount=6, mode=Mode.PRIVATE)
    fillet_1_piece_28b = split(fillet_1_piece_28b, bisect_by=Plane(origin=(22.411781885, 1.507353177, -12.687859684), z_dir=(0, -0.7071067811865476, 0.7071067811865476)), keep=Keep.TOP, mode=Mode.PRIVATE)
    fillet_1_piece_28b = split(fillet_1_piece_28b, bisect_by=Plane(origin=(23.130997996, 1.507353177, -11.968643573), z_dir=(-0.7071067811865476, -0.7071067811865476, 0)), keep=Keep.TOP, mode=Mode.PRIVATE)
    fillet_1_piece_28 = fillet_1_piece_28a & fillet_1_piece_28b
    add(fillet_1_piece_28, mode=Mode.SUBTRACT)


solid = part.part
